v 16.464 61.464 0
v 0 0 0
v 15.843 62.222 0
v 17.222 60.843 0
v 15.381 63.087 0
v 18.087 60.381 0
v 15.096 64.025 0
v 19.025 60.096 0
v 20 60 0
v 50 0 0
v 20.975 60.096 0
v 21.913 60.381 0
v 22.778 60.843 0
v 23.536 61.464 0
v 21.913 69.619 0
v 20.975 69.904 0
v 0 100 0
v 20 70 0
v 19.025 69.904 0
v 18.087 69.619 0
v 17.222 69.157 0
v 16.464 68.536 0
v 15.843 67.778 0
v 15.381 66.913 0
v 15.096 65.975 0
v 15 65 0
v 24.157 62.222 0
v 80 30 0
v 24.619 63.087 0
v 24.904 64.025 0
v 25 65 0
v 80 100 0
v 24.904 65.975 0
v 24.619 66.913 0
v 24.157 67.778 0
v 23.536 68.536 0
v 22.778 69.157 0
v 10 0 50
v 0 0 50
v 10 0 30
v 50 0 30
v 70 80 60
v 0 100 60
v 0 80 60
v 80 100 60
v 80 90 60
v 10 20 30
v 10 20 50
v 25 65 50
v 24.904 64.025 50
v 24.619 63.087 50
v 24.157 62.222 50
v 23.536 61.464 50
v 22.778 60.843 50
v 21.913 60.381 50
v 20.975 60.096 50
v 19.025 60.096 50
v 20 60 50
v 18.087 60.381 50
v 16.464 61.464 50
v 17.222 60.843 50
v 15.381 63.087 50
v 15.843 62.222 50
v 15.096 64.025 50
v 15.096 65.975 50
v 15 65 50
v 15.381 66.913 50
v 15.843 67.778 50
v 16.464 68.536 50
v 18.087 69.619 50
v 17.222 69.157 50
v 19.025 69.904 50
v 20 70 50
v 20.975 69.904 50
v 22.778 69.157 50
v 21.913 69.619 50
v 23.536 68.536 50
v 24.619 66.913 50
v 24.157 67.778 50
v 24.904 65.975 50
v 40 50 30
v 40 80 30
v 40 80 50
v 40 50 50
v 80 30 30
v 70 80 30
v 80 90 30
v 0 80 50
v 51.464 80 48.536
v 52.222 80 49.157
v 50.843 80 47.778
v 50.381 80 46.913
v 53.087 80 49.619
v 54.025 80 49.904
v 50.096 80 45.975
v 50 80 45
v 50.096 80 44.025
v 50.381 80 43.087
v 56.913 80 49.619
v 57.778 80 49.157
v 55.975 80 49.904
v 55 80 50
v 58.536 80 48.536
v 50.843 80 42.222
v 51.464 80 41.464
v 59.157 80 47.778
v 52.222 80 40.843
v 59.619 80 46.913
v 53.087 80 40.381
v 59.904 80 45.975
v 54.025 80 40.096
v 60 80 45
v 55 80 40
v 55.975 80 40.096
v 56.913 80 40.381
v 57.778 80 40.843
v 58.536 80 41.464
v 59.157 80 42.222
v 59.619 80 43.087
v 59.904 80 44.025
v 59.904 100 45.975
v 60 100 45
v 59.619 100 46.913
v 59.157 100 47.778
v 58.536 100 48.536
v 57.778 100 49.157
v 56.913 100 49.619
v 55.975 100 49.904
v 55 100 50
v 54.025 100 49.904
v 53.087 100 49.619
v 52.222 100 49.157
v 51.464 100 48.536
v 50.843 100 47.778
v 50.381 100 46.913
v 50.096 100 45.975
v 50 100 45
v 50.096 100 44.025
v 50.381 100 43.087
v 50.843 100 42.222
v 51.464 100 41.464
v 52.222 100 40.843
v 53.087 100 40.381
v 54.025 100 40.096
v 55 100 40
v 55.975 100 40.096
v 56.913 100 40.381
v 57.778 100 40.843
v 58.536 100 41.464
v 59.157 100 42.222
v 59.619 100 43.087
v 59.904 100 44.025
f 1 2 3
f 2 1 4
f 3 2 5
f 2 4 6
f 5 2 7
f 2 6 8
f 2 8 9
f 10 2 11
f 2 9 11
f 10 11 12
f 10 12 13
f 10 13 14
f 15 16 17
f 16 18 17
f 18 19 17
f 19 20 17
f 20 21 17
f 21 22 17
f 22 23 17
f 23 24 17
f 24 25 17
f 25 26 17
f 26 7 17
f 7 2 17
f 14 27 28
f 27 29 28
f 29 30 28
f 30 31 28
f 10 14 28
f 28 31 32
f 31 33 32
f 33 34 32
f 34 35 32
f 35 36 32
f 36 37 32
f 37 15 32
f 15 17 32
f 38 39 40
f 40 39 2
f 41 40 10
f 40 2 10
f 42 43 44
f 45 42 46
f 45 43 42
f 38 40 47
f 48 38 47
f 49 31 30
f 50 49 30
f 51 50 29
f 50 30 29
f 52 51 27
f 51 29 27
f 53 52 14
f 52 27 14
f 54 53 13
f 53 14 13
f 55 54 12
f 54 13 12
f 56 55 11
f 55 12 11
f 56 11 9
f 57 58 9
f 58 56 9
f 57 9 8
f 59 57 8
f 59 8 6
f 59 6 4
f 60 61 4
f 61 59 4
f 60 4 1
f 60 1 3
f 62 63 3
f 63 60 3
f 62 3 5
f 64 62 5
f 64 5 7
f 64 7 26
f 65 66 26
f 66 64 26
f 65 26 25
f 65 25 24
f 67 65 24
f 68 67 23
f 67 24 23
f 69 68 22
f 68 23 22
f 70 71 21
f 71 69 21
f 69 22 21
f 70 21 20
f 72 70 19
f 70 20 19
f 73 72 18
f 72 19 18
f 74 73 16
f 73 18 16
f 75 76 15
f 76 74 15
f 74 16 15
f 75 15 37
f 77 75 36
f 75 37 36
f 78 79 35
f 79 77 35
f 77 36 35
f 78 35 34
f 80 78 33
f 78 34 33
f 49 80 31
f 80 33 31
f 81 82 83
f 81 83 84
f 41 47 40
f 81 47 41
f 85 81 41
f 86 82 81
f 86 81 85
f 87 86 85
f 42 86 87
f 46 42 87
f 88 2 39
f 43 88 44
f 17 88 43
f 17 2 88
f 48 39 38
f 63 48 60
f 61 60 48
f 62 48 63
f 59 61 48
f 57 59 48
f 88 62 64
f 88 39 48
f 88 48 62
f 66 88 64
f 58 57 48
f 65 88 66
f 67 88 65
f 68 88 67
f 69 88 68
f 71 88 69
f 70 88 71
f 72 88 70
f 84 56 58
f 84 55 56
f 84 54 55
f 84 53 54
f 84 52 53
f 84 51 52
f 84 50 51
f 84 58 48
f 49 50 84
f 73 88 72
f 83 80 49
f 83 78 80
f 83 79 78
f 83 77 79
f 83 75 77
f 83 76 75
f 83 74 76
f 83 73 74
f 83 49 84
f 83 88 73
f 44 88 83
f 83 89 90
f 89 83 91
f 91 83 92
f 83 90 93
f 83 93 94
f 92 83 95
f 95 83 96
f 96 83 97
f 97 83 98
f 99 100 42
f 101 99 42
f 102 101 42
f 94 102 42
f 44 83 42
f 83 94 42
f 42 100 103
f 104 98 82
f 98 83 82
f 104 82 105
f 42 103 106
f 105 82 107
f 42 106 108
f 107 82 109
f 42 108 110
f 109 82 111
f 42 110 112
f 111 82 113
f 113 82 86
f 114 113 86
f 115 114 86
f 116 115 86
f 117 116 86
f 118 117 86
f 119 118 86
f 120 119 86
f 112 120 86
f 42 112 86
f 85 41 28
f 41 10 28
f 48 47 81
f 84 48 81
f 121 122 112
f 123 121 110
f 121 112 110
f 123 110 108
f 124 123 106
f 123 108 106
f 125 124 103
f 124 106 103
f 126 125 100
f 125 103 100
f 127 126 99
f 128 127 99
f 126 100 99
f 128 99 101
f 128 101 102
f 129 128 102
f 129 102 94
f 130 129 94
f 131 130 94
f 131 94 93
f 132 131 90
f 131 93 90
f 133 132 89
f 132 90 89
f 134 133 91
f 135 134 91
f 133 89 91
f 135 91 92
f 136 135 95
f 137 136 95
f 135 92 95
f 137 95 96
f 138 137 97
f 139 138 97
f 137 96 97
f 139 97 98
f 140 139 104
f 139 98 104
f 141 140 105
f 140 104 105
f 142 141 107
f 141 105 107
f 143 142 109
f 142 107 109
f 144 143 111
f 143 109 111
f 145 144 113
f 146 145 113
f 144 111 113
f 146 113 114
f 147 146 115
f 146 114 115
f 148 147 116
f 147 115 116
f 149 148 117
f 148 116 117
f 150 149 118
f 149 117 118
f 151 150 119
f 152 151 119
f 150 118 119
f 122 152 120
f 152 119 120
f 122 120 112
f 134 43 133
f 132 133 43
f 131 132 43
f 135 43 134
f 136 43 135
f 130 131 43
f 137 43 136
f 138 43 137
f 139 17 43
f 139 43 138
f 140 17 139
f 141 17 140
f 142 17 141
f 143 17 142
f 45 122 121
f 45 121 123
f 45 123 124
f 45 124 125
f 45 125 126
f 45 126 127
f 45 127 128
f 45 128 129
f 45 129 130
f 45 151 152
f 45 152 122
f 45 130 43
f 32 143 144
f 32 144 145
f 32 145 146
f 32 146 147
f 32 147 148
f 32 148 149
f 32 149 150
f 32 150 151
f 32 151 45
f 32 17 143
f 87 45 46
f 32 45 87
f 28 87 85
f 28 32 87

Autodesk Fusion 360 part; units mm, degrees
sketch "Sketch1" plane through (0, 0, 0) normal (0, 0, 1) x (1, 0, 0)
  line L0 (0, 0) -> (50, 0)
  line L1 (0, 0) -> (0, 100)
  line L2 (0, 100) -> (80, 100)
  line L3 (80, 100) -> (80, 90)
  line L4 (80, 90) -> (80, 30)
  line L5 (50, 0) -> (80, 30)
  line L6 (0, 0) -> (10, 0)
  line L7 (10, 0) -> (10, 20)
  line L8 (0, 100) -> (0, 80)
  line L9 (0, 80) -> (70, 80)
  line L10 (70, 80) -> (80, 90)
  line L11 (0, 80) -> (40, 80)
  line L12 (40, 80) -> (40, 50)
  line L13 (10, 20) -> (40, 50)
  circle A0 centre (20, 65) radius 5
extrude "Extrude1" add sketch "Sketch1" along normal blind 50 contours L0 L1 L6 L7 L9 L11 L12 L13
extrude "Extrude2" add sketch "Sketch1" along normal blind 30 contours L0 L4 L5 L7 L9 L10 L12 L13
extrude "Extrude3" add sketch "Sketch1" along normal blind 60 contours L1 L2 L3 L8 L9 L10 L11
sketch "Sketch2" plane through (0, 80, 0) normal (0, -1, 0) x (1, 0, 0)
  line L0 (40, 30) -> (70, 30)
  line L1 (70, 30) -> (70, 60)
  line L2 (70, 60) -> (0, 60)
  line L3 (0, 60) -> (0, 50)
  line L4 (0, 50) -> (40, 50)
  line L5 (40, 50) -> (40, 30)
  circle A0 centre (55, 45) radius 5
extrude "Extrude4" cut sketch "Sketch2" against normal blind 40 contours A0
